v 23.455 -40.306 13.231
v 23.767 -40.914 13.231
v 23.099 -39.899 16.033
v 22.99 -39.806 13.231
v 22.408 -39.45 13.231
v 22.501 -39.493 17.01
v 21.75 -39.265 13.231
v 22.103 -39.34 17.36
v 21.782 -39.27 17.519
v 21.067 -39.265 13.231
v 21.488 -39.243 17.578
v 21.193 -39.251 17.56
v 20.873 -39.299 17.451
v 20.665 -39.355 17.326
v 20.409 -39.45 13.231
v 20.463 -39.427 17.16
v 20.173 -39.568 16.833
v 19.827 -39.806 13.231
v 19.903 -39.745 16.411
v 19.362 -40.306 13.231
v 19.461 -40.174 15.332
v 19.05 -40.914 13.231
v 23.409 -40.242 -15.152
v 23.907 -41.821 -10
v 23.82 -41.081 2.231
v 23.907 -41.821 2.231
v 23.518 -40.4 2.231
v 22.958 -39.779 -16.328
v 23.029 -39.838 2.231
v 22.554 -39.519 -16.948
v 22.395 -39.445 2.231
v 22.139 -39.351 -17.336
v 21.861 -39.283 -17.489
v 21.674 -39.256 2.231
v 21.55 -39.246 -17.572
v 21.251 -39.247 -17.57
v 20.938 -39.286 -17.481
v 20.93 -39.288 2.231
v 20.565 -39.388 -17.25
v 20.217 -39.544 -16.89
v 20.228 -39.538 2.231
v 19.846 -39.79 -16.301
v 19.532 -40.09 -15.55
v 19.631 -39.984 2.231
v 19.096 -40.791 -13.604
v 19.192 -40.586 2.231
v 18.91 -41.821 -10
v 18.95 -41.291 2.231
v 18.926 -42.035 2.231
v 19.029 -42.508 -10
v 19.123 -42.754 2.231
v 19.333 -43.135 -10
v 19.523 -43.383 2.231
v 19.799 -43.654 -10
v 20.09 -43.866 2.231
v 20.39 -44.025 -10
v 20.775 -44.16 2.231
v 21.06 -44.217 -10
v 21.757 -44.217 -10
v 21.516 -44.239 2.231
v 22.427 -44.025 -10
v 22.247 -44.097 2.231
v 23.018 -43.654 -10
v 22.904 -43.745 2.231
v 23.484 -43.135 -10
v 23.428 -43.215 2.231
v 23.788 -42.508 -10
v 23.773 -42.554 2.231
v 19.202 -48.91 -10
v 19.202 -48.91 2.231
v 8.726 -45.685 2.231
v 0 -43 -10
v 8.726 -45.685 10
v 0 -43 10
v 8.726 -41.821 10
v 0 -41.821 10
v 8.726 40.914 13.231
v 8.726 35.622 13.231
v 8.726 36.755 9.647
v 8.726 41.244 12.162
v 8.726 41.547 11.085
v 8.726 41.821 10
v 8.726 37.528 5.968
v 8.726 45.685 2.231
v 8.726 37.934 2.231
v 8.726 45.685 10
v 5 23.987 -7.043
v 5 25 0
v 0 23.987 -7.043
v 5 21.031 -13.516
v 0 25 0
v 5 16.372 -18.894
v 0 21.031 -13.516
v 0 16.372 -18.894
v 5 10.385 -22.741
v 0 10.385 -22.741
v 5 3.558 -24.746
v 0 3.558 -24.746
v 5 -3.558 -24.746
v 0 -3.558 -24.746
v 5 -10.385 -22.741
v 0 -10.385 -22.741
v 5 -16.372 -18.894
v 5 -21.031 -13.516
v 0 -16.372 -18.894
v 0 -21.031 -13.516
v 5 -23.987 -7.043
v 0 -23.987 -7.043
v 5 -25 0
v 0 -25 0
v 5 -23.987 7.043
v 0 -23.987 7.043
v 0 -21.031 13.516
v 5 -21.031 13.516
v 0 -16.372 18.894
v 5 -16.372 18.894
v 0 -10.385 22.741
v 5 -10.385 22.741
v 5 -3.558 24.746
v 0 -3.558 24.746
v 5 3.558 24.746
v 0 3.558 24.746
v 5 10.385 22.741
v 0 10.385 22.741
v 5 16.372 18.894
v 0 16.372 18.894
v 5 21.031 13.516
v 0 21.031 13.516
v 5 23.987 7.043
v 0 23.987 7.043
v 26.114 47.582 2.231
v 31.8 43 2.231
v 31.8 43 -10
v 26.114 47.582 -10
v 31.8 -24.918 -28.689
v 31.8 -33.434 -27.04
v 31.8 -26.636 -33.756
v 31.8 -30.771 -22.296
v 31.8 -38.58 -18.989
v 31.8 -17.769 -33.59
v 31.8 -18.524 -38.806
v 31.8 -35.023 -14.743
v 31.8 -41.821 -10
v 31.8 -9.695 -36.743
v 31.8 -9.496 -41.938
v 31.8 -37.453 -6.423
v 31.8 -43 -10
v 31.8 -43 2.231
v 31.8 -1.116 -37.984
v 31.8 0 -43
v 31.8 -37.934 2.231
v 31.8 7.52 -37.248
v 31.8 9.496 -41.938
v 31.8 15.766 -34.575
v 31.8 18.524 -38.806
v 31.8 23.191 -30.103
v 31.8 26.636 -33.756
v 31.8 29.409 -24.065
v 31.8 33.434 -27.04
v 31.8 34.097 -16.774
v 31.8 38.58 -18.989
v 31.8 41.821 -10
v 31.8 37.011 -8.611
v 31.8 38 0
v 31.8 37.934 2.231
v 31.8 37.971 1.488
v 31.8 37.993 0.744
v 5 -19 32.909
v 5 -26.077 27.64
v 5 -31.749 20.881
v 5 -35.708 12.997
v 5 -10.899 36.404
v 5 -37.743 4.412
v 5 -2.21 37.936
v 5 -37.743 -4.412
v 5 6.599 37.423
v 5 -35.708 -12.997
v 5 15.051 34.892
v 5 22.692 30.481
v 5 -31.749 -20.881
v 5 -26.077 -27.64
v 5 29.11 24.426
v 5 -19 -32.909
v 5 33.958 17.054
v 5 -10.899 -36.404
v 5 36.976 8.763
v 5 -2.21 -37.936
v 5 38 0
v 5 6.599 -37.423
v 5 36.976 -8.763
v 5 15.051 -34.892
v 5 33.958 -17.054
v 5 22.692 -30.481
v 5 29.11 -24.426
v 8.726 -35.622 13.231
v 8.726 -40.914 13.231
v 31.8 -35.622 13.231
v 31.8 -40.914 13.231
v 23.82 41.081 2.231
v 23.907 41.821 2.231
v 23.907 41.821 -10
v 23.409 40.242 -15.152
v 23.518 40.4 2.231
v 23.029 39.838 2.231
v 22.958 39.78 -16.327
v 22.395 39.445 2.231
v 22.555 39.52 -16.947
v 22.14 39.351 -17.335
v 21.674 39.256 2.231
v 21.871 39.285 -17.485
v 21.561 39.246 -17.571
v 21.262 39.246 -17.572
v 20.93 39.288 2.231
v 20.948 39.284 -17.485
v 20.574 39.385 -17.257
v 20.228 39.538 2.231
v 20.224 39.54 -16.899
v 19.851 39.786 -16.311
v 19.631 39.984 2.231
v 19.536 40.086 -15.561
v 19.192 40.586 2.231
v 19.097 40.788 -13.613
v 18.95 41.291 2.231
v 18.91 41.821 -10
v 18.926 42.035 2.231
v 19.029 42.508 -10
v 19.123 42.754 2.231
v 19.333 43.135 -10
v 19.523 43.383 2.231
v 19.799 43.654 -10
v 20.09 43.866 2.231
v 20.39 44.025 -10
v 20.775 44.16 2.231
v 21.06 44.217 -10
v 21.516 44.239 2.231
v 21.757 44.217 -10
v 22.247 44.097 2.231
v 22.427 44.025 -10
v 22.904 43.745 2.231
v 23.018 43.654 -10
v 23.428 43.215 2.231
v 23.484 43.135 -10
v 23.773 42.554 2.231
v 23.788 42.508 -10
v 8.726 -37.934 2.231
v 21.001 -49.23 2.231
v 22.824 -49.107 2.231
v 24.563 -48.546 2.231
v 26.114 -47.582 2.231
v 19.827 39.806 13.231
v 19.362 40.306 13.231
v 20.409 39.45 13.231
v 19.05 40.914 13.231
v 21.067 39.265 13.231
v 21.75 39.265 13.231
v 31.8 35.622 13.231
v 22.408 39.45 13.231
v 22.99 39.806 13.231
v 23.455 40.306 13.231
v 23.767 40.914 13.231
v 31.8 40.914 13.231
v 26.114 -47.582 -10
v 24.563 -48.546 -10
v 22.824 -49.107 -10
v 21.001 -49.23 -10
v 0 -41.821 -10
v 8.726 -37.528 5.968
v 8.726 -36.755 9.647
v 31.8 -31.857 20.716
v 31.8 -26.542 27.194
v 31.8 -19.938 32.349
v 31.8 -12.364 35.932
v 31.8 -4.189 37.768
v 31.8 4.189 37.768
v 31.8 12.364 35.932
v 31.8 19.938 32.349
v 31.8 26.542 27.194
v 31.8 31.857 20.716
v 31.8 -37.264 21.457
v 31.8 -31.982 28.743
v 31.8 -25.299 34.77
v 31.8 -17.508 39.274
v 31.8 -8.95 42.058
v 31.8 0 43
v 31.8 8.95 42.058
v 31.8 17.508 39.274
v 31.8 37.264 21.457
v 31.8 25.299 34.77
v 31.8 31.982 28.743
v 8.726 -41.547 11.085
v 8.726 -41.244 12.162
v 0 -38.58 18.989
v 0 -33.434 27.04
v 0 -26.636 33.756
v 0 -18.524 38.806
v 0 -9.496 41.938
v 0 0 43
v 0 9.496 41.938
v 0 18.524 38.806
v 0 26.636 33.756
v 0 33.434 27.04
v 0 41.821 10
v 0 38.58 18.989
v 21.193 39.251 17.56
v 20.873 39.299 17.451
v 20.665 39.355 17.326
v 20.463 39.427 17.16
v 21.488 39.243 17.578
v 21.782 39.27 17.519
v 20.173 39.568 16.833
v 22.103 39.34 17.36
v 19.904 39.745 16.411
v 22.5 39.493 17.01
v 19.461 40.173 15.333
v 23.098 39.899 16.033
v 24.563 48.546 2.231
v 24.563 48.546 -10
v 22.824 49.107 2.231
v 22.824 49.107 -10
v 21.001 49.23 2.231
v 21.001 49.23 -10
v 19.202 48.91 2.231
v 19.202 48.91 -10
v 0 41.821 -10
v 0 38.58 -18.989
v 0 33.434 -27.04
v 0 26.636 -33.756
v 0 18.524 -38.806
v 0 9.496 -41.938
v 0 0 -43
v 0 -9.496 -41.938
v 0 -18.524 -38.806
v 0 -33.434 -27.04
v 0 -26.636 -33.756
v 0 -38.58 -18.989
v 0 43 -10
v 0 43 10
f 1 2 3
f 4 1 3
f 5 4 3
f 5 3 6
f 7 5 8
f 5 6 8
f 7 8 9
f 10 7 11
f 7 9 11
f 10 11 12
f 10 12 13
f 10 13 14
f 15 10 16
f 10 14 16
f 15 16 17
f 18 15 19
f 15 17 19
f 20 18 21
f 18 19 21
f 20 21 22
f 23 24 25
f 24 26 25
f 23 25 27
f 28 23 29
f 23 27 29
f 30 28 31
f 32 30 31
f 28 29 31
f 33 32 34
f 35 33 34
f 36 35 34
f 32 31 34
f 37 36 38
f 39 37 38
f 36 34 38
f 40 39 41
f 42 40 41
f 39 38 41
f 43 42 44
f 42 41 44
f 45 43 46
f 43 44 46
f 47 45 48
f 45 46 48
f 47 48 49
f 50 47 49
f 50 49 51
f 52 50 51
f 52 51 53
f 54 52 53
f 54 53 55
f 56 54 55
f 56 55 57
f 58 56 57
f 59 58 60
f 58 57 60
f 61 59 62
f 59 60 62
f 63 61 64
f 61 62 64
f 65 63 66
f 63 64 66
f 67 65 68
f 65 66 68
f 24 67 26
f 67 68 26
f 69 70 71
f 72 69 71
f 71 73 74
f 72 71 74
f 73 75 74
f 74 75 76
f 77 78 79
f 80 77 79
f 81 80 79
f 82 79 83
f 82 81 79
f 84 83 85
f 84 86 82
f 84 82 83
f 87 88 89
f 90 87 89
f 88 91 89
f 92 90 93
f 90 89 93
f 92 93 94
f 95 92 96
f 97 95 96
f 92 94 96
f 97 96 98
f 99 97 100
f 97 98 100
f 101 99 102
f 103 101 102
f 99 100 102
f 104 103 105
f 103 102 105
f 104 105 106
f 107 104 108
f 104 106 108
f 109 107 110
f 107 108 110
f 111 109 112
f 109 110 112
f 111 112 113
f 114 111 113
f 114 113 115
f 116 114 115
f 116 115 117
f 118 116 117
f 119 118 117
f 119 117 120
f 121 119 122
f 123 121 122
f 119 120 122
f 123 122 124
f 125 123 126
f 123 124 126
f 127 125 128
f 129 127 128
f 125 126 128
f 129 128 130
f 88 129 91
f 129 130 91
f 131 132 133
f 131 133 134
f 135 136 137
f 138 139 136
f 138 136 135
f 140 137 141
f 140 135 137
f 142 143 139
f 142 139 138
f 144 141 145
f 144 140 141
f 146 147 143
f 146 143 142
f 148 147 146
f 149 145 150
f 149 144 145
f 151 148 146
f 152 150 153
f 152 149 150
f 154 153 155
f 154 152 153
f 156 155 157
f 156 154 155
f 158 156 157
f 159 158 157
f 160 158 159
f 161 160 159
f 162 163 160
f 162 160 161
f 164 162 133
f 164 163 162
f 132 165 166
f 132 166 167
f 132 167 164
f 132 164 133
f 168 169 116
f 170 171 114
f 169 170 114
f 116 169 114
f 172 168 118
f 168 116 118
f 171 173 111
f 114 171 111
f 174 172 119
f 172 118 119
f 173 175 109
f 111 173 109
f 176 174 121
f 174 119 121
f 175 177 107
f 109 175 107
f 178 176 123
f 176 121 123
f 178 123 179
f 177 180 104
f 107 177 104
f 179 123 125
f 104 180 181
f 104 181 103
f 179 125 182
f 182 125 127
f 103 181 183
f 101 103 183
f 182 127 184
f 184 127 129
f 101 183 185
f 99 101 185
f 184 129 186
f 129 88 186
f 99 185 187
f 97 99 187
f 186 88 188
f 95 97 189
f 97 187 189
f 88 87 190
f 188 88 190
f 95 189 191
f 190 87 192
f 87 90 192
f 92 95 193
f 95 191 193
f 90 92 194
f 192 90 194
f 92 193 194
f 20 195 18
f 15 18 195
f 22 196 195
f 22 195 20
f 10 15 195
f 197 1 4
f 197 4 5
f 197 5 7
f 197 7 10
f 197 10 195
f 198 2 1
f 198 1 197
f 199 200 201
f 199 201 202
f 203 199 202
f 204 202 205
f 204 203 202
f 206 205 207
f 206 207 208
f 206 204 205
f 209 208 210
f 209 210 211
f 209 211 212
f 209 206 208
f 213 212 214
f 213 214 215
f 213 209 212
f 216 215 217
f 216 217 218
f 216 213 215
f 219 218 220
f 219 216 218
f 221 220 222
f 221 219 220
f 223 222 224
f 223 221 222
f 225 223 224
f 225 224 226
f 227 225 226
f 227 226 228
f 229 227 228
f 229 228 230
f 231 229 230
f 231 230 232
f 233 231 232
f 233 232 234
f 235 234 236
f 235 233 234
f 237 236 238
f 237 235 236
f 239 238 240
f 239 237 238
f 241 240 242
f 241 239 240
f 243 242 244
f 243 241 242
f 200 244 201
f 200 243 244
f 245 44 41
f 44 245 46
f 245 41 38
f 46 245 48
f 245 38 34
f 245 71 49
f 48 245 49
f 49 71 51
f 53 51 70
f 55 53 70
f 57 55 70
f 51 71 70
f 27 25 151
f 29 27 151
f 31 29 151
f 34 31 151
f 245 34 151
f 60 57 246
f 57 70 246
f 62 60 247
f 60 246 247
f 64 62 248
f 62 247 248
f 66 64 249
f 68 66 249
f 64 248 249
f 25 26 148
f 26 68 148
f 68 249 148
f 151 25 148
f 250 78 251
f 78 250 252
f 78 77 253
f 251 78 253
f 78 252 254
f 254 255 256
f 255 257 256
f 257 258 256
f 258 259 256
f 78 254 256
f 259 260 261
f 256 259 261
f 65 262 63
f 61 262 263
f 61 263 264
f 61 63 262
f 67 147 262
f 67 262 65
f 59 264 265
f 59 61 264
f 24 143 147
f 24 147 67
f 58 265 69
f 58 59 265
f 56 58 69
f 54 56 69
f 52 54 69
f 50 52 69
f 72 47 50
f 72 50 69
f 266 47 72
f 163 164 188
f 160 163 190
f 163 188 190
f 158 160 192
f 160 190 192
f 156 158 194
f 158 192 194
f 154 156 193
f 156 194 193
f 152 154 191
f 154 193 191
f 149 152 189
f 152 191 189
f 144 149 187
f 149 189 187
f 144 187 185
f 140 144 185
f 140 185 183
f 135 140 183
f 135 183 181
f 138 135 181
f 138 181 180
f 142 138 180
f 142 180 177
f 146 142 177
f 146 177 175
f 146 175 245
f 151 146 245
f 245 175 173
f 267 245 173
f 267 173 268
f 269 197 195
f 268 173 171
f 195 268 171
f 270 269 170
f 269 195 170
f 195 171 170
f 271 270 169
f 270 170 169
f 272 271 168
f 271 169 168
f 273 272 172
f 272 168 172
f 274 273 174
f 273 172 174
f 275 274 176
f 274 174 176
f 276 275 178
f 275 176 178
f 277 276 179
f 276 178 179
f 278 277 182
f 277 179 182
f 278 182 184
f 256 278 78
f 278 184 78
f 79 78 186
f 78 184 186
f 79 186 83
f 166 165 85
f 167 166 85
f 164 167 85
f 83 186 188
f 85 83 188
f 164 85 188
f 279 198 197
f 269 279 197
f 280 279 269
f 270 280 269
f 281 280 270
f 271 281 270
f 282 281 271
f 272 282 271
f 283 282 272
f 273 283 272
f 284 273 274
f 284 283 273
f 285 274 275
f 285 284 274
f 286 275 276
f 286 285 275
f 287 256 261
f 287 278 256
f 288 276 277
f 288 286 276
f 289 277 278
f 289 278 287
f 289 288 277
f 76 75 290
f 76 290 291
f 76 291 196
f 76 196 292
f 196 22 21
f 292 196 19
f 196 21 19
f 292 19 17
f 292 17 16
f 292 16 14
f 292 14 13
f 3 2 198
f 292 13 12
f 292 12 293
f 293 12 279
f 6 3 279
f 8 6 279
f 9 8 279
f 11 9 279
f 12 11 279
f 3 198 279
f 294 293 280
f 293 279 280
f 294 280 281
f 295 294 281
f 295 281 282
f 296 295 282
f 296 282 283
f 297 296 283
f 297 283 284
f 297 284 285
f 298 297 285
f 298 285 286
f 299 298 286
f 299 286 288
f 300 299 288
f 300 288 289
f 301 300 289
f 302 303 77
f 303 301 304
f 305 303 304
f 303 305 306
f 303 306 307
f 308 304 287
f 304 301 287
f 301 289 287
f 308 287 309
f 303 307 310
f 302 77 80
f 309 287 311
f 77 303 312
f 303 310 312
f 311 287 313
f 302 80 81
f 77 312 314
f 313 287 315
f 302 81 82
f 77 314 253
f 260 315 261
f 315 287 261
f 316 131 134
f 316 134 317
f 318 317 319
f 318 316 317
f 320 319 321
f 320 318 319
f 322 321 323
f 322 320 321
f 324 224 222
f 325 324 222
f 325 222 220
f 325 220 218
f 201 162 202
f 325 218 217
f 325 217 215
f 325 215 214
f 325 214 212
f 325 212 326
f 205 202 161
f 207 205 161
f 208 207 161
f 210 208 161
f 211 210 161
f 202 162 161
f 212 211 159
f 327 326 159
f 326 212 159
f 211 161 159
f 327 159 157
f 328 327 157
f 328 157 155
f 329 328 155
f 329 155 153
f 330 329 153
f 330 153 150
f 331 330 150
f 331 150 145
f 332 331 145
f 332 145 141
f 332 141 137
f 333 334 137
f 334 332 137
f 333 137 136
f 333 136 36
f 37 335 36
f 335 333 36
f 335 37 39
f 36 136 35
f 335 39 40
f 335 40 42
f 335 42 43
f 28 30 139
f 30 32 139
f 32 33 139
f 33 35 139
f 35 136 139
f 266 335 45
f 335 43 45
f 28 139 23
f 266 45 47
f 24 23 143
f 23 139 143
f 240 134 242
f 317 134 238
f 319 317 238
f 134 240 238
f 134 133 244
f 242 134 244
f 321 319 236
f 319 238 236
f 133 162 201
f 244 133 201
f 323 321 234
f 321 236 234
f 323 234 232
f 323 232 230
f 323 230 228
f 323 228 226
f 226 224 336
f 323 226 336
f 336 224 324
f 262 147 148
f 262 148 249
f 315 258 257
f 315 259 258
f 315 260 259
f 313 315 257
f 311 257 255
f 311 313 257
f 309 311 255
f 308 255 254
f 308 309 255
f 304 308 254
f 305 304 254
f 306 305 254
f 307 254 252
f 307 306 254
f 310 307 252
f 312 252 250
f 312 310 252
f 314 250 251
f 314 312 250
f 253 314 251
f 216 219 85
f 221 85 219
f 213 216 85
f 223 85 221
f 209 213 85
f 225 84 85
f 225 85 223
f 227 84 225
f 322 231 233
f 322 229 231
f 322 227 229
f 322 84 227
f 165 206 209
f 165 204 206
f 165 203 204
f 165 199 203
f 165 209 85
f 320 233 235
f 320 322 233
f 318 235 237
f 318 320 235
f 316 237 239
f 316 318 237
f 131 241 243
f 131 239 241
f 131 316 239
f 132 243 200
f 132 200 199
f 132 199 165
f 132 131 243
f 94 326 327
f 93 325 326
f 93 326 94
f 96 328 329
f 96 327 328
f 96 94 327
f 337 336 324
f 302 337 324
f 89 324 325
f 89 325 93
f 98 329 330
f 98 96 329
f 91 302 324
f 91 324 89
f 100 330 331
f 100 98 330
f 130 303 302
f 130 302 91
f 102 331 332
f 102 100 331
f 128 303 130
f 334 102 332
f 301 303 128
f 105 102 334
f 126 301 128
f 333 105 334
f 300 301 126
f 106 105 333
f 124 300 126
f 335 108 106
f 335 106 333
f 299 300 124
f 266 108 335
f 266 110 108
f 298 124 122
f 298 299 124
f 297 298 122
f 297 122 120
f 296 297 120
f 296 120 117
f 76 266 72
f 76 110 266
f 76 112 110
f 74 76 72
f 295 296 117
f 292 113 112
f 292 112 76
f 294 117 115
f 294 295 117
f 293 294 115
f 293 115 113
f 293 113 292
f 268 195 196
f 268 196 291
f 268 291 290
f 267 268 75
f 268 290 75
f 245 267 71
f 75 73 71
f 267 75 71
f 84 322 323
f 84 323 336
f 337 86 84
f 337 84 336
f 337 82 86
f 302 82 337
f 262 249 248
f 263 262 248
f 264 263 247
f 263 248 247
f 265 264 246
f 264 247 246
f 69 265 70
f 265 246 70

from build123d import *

# Parameters (mm, degrees)
BOSS_EXTRUDE1_DEPTH     = 10
SKETCH4_R               = 2.5
CUT_EXTRUDE1_DEPTH      = 73.697811944
CUT_EXTRUDE2_REACH      = 109.281
CUT_EXTRUDE2_END_RADIUS = 38
SKETCH5_W               = 23.074324902
SKETCH5_H               = 11


with BuildPart() as part:
    # Sketch1 → Revolve1 (revolve)
    with BuildSketch(Plane.XY):
        Polygon((5, -38), (5, -25), (0, -25), (0, -43), (31.8, -43), (31.8, -38), align=None)
    revolve(axis=Axis((96.017453448, 0, 0), (-1, 0, 0)))

    # Sketch3 → Boss-Extrude1 (add, symmetric)
    with BuildSketch(Plane.XY):
        with BuildLine():
            Line((31.8, -43), (26.114355816, -47.581512833))
            ThreePointArc((26.114355816, -47.581512833), (22.82386933, -49.10680541), (19.202406183, -48.909768758))
            Line((19.202406183, -48.909768758), (0, -43))
            Line((0, -43), (0, -38))
            Line((0, -38), (31.8, -38))
            Line((31.8, -38), (31.8, -43))
        make_face()
    boss_extrude1 = extrude(amount=BOSS_EXTRUDE1_DEPTH, both=True)

    # Sketch4 → Cut-Extrude1 (cut, symmetric)
    with BuildSketch(Plane.XY):
        with Locations((21.408505666, -41.741566399)):
            Circle(SKETCH4_R)
    cut_extrude1 = extrude(amount=CUT_EXTRUDE1_DEPTH, both=True, mode=Mode.SUBTRACT)

    # Cut-Extrude2: up to this cylinder (the profile starts outside it)
    cut_extrude2_end = Plane(origin=(20.262838, 0, 0), z_dir=(1, 0, 0)) * Cylinder(CUT_EXTRUDE2_END_RADIUS, 295.562, mode=Mode.PRIVATE)
    # Sketch5 → Cut-Extrude2 (cut, up to the surface)
    with BuildSketch(Plane(origin=(0, -50, 0), x_dir=(1, 0, 0), z_dir=(0, 1, 0)), mode=Mode.PRIVATE) as cut_extrude2_sk1:
        with Locations((20.262837549, -7.731366933)):
            Rectangle(SKETCH5_W, SKETCH5_H)
    cut_extrude2_tool1 = extrude(cut_extrude2_sk1.sketch, amount=CUT_EXTRUDE2_REACH, mode=Mode.PRIVATE) - cut_extrude2_end
    cut_extrude2 = cut_extrude2_tool1.solids().sort_by_distance((20.262838, -50, 7.731367))[0]
    add(cut_extrude2, mode=Mode.SUBTRACT)

    # Mirror1: Boss-Extrude1, Cut-Extrude1, Cut-Extrude2 across plane
    add(boss_extrude1.mirror(Plane.ZX))
    add(cut_extrude1.mirror(Plane.ZX), mode=Mode.SUBTRACT)
    add(cut_extrude2.mirror(Plane.ZX), mode=Mode.SUBTRACT)


solid = part.part
